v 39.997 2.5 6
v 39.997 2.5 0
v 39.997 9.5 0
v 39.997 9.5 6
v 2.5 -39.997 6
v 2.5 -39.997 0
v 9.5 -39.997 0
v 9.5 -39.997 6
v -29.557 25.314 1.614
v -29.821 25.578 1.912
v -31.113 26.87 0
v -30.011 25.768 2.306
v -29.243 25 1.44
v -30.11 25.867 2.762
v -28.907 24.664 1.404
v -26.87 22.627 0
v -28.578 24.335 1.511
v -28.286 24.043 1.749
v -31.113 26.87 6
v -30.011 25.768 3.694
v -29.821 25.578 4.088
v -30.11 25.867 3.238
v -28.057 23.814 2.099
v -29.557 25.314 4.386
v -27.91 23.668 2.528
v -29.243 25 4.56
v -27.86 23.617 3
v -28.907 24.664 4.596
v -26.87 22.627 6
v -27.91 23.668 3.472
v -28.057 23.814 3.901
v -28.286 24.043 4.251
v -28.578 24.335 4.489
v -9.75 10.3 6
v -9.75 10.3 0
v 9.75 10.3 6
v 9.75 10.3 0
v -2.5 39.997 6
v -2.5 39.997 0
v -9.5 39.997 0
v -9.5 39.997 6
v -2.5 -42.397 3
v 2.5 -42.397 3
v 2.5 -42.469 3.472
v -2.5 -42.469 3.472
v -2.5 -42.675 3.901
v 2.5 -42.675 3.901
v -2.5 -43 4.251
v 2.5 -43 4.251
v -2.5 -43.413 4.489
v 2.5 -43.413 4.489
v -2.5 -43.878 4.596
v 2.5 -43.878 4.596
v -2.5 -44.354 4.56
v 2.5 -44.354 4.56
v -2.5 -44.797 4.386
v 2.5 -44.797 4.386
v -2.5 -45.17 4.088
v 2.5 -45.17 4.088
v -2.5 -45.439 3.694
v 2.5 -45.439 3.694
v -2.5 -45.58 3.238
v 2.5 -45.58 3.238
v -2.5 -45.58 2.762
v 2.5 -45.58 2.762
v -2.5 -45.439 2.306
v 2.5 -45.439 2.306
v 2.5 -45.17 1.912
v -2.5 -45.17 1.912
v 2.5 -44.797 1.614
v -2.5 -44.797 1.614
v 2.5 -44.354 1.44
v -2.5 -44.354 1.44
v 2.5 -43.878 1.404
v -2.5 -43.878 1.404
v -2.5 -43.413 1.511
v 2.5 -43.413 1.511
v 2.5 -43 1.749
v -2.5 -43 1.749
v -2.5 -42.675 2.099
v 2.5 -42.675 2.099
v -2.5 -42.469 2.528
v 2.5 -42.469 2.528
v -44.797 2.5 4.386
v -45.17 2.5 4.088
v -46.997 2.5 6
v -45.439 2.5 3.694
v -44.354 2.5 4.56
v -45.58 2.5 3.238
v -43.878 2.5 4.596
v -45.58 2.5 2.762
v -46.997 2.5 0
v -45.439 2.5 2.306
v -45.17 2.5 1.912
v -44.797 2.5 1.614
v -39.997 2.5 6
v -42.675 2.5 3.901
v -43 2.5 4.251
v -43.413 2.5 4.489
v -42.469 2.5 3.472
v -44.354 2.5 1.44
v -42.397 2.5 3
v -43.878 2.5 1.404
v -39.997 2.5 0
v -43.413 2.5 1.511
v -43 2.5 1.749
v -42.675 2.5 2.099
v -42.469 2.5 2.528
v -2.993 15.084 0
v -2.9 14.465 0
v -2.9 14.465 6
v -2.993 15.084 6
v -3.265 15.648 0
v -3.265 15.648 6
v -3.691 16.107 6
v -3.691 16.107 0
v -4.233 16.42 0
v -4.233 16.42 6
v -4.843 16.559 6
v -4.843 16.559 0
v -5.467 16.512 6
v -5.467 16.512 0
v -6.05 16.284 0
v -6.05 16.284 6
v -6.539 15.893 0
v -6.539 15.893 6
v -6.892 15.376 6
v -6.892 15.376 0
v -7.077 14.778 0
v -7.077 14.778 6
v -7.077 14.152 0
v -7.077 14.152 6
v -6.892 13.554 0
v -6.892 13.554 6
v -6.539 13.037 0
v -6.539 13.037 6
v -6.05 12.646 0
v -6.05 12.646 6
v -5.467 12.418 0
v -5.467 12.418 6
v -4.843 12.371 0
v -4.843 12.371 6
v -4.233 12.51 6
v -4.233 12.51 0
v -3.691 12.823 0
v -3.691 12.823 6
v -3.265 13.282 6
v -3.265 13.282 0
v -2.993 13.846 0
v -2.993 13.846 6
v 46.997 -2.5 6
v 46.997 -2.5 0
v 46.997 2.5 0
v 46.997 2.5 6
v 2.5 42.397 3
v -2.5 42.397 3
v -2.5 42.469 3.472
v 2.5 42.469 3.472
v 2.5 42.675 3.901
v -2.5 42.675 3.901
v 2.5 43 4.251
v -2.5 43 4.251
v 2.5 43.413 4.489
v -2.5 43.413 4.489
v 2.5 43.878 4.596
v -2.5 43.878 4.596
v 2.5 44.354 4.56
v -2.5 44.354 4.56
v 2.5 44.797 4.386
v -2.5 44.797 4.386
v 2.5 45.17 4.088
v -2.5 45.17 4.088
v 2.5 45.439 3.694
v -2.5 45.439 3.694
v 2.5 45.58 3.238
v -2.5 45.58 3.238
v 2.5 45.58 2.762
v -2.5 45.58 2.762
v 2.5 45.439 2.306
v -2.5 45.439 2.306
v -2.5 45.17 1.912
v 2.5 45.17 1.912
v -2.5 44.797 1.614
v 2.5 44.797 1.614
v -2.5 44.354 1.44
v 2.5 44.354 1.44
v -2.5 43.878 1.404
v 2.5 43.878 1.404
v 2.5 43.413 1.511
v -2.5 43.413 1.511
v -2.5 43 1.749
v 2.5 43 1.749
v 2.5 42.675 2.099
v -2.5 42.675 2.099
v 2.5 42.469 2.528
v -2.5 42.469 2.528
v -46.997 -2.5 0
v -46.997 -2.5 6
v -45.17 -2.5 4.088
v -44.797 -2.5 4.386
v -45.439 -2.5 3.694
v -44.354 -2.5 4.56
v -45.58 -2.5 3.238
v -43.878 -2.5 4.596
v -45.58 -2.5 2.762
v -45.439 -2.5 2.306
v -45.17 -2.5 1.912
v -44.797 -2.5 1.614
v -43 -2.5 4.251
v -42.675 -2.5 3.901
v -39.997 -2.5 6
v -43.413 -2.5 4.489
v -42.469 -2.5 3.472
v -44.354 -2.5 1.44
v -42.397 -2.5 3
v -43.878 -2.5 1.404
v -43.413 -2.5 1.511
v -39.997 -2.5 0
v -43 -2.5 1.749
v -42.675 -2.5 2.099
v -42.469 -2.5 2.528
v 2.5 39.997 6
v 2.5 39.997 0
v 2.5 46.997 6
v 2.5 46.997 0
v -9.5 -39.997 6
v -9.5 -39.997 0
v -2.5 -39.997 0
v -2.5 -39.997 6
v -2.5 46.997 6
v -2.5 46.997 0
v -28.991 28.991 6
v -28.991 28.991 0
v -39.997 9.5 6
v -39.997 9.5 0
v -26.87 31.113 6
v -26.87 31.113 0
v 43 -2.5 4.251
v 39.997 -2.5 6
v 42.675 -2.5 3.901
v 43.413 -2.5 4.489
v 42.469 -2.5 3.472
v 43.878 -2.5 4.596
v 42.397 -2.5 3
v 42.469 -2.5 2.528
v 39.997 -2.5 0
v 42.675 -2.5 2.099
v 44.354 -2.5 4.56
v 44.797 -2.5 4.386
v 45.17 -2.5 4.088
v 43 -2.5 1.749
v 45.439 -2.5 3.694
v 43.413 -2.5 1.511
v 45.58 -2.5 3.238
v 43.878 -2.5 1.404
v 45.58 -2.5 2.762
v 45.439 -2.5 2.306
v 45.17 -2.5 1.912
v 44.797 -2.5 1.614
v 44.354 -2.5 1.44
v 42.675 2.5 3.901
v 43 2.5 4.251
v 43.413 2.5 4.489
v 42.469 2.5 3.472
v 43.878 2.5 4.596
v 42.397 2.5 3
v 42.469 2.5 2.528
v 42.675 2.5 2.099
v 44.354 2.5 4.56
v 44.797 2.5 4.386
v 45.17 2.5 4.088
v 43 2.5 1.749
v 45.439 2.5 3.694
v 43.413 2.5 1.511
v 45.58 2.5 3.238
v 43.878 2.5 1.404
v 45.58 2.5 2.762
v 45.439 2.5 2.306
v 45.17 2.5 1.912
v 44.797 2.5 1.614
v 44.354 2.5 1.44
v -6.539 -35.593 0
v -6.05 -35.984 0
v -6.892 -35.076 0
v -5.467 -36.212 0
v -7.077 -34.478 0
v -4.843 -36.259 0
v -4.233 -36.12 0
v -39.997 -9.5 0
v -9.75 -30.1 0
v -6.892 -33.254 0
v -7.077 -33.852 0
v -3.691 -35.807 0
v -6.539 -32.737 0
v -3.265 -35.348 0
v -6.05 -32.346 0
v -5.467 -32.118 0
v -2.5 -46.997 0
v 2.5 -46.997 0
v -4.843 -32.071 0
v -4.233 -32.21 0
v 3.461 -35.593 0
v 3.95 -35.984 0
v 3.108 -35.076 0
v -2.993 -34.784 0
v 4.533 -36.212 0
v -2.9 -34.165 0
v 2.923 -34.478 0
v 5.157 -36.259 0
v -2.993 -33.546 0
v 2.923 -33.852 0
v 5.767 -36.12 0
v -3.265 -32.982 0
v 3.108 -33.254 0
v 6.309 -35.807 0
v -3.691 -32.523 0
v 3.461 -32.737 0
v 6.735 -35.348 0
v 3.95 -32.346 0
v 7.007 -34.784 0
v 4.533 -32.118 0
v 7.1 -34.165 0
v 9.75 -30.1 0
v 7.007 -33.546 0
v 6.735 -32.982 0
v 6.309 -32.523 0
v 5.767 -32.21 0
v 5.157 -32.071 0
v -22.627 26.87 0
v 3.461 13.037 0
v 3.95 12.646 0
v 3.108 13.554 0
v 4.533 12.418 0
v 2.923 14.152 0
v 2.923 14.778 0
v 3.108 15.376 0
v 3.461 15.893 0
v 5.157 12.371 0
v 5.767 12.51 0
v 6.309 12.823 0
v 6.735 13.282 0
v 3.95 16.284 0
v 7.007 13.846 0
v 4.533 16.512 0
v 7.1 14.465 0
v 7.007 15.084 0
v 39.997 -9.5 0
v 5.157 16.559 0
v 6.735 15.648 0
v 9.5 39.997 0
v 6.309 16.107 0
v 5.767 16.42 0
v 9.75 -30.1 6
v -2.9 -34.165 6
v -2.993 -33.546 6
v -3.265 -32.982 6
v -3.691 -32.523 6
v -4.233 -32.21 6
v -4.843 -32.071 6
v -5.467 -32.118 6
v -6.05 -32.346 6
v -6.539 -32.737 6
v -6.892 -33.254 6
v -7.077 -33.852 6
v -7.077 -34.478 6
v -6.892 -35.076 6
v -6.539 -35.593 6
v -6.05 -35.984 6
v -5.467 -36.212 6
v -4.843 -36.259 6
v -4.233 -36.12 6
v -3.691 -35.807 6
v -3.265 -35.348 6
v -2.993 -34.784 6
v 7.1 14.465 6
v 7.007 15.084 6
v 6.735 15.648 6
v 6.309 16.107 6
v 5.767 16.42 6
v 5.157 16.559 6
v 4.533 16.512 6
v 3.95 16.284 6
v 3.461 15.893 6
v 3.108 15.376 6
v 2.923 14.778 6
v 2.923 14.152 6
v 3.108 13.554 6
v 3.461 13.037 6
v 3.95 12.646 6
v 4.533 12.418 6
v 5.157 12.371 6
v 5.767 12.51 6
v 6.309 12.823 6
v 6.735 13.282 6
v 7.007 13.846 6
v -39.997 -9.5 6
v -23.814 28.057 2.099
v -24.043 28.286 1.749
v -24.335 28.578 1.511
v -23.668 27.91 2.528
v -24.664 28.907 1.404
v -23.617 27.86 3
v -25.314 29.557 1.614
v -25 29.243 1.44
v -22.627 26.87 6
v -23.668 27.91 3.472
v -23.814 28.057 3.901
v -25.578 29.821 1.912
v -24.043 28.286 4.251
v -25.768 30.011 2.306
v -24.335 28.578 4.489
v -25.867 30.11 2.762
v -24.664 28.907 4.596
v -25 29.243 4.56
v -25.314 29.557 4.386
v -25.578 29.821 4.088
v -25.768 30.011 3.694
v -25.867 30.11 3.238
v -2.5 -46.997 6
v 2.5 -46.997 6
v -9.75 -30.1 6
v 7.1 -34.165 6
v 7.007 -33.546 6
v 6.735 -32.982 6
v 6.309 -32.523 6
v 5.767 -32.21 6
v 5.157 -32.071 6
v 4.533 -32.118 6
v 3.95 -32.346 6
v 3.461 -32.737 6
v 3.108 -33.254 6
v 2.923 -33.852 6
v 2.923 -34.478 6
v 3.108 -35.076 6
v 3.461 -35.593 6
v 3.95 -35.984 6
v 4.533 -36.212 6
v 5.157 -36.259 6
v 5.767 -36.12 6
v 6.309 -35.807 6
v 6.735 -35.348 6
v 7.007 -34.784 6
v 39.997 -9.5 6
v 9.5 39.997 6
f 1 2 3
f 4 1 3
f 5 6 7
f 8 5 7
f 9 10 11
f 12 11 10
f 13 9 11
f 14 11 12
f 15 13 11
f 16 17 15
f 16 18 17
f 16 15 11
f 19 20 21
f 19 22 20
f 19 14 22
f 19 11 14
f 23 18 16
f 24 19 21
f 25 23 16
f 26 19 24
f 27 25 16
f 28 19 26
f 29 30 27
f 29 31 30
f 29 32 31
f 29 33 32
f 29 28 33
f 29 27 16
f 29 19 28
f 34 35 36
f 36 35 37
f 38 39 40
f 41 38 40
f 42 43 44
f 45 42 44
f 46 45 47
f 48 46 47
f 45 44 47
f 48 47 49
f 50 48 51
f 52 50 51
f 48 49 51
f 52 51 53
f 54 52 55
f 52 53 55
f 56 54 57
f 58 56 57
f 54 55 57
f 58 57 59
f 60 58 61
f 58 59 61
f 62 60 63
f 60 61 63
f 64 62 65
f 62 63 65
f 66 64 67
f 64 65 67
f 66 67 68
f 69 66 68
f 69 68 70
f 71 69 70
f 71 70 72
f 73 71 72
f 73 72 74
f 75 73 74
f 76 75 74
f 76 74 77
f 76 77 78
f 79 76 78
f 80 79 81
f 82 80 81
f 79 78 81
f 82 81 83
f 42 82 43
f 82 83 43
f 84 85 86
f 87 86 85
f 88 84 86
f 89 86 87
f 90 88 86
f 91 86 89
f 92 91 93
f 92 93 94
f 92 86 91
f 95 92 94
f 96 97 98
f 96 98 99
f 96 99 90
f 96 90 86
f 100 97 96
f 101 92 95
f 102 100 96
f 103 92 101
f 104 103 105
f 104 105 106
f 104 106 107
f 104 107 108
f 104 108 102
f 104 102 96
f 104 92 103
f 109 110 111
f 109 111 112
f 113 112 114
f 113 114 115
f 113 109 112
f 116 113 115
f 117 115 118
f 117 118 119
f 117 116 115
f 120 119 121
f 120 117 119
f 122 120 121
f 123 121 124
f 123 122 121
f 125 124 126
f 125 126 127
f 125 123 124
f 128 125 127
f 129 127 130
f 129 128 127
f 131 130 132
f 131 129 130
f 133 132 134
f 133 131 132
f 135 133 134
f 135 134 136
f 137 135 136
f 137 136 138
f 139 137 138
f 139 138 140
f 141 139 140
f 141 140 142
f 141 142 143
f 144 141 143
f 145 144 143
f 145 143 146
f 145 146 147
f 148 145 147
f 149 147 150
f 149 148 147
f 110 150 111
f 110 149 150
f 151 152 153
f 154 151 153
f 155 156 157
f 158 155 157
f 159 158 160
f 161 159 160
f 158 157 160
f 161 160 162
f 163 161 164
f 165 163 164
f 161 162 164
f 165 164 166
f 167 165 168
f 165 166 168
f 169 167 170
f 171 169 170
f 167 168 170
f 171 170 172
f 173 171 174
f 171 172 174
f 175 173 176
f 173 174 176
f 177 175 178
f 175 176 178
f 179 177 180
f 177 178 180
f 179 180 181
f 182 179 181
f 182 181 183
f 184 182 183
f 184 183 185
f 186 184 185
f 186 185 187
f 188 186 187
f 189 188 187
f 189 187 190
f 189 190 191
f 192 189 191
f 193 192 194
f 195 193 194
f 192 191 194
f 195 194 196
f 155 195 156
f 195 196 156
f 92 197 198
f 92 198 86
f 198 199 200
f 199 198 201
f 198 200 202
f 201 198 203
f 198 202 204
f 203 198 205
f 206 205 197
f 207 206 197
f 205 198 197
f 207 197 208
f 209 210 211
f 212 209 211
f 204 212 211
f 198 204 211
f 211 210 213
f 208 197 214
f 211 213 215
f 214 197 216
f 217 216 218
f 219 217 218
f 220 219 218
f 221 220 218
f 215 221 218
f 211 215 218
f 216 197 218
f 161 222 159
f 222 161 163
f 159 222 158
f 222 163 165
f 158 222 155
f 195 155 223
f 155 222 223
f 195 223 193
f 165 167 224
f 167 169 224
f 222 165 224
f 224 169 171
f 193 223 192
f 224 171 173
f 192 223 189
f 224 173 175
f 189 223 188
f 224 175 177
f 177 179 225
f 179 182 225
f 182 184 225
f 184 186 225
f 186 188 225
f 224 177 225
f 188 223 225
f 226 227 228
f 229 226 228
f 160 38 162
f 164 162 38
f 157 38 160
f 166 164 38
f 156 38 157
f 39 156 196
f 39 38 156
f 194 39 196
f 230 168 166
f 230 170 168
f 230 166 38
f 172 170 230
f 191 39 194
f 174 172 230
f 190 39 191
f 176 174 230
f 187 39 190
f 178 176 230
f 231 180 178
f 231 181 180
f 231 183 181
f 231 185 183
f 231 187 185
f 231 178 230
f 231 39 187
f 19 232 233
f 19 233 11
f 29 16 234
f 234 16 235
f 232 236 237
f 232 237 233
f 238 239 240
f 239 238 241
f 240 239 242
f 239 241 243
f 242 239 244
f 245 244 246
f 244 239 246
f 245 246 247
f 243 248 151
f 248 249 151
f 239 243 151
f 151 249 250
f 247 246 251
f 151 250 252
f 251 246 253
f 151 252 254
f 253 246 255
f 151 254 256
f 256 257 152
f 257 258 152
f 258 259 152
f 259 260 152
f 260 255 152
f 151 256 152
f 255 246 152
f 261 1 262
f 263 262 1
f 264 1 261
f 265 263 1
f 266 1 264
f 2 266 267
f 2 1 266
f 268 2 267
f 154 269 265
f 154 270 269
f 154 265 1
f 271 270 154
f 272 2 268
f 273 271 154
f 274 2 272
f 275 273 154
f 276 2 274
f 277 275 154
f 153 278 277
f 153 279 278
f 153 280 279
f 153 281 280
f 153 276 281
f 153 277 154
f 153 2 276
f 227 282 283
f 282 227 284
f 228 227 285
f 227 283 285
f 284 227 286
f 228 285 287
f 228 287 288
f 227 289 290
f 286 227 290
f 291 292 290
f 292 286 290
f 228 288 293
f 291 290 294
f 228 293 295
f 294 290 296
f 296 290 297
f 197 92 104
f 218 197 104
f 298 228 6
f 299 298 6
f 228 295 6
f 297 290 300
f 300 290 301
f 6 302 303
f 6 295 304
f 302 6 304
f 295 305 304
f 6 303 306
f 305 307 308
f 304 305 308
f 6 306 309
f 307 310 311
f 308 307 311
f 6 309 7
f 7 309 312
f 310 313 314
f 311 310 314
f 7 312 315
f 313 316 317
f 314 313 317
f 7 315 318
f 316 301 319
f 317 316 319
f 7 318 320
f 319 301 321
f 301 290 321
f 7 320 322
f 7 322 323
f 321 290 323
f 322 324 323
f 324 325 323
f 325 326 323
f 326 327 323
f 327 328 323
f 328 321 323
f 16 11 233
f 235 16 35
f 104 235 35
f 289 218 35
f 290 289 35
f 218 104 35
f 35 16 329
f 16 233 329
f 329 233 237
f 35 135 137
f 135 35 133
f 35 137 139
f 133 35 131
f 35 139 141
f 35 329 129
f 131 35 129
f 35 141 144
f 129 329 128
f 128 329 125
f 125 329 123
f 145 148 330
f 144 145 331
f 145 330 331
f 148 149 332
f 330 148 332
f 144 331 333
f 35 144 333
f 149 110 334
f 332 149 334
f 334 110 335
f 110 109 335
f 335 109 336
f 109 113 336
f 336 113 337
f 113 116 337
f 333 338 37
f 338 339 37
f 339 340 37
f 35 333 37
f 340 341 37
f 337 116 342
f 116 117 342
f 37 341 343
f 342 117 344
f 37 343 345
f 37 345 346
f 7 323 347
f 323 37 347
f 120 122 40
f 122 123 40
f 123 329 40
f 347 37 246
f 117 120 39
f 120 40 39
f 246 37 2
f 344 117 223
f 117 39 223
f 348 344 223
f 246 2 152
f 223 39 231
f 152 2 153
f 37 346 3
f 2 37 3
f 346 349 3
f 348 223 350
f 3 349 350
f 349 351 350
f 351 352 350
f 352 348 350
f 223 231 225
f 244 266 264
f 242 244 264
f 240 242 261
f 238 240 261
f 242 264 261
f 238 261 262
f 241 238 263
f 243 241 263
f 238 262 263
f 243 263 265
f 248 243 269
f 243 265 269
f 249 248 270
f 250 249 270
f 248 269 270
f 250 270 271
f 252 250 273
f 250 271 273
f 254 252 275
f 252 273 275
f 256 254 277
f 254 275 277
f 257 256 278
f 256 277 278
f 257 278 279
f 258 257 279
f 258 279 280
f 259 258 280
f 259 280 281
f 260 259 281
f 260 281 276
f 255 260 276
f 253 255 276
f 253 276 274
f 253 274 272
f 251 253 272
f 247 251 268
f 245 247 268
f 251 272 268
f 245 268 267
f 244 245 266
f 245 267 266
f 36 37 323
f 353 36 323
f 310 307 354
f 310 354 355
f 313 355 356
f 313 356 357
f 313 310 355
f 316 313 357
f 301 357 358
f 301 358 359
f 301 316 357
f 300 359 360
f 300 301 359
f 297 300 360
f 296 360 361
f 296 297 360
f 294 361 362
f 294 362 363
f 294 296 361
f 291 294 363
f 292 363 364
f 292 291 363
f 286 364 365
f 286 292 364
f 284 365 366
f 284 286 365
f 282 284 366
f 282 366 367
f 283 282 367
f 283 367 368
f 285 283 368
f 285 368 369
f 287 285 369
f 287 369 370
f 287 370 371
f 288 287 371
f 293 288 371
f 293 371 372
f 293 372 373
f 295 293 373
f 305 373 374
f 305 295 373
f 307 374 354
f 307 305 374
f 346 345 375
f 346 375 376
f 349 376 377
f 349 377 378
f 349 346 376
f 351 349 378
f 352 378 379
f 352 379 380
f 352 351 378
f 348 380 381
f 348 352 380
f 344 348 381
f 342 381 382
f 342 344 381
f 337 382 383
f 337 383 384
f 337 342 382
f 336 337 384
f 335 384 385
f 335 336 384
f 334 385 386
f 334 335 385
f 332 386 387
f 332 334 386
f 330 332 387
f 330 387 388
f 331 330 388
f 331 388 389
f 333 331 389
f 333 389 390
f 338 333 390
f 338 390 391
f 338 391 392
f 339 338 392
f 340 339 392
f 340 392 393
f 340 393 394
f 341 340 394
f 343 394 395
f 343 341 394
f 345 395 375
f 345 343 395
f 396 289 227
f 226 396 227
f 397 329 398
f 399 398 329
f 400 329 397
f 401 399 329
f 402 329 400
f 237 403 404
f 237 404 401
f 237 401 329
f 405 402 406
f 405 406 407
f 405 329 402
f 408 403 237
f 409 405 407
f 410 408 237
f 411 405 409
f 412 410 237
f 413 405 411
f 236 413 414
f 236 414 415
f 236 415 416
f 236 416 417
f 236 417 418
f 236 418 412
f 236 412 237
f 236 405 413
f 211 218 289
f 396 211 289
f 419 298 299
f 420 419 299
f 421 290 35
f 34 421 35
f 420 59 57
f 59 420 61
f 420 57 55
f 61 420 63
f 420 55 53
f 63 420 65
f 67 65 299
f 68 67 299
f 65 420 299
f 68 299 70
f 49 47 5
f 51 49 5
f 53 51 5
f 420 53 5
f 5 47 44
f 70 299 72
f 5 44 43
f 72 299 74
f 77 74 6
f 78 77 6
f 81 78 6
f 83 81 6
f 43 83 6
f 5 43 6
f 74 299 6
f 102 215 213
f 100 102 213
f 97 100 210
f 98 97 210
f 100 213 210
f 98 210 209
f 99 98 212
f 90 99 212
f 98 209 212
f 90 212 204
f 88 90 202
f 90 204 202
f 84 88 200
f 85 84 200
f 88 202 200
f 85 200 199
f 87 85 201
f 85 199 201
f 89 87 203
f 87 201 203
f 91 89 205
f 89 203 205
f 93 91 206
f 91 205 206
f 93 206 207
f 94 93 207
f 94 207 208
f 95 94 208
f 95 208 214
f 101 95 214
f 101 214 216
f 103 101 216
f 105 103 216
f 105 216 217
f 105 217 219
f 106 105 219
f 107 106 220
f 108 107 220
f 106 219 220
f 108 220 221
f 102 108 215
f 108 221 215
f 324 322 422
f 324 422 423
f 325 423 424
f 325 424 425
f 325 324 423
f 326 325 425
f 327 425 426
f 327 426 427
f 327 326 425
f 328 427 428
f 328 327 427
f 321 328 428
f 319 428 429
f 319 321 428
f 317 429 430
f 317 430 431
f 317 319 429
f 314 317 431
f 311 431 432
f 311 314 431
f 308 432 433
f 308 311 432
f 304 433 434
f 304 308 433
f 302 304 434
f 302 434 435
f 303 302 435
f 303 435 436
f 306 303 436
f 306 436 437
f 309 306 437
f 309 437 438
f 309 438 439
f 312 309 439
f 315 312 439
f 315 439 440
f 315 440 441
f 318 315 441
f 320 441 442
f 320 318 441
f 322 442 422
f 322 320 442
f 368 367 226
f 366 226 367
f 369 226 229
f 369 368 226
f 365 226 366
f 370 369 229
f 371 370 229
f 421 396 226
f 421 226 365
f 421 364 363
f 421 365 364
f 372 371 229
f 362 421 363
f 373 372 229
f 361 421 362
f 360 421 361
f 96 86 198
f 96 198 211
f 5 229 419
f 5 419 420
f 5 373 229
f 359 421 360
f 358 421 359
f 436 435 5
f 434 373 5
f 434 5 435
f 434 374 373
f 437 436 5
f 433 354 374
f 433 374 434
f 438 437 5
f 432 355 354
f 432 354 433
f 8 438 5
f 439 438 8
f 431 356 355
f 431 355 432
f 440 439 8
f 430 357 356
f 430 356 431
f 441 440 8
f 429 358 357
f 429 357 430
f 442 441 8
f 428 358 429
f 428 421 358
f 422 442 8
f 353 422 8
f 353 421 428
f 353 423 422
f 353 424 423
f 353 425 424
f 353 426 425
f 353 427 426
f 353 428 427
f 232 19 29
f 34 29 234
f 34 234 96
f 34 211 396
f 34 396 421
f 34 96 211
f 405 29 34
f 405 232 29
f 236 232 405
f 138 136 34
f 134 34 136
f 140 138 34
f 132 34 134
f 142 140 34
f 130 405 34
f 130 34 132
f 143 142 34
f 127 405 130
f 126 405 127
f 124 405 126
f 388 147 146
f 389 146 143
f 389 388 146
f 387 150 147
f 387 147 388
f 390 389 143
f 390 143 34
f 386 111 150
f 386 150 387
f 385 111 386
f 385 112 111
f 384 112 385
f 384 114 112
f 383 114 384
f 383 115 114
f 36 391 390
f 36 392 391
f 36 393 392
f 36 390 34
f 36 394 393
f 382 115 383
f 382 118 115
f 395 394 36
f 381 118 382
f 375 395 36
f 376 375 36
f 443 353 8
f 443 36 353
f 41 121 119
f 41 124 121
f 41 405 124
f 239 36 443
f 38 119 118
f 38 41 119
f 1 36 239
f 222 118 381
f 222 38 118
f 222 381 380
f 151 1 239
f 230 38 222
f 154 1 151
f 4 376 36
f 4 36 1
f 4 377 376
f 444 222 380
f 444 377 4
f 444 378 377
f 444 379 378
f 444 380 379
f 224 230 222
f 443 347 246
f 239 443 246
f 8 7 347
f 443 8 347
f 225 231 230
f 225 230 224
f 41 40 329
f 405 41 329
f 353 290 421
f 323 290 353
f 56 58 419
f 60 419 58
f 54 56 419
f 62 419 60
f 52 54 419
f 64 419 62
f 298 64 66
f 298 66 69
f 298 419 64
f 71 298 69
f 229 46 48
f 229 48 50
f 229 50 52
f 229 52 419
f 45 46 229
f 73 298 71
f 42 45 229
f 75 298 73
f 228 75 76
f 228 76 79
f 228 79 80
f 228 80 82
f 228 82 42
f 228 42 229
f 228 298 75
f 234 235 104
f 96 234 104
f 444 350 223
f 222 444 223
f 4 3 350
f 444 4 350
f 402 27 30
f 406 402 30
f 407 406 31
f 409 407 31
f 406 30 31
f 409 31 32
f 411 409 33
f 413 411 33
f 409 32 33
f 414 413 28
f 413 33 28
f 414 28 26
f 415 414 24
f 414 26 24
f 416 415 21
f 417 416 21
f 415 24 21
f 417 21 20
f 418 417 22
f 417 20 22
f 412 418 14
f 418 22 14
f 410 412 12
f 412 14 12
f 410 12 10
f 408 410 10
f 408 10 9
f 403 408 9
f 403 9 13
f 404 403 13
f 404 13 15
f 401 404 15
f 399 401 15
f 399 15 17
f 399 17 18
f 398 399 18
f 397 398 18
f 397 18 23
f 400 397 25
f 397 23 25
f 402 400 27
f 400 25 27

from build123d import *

# Parameters (mm, degrees)
SKETCH_1_R          = 2.1
SKETCH_1_W          = 5
SKETCH_1_H          = 7
SKETCH_1_W_2        = 7
SKETCH_1_H_2        = 5
SKETCH_1_W_3        = 19.5
SKETCH_1_H_3        = 6.75
EXTRUDE_2_DEPTH     = 6
SKETCH_2_R          = 1.6
CUT_EXTRUDE_1_DEPTH = 5
SKETCH_3_R          = 1.6
CUT_EXTRUDE_2_DEPTH = 5
SKETCH_4_R          = 1.6
CUT_EXTRUDE_3_DEPTH = 5
SKETCH_5_R          = 1.6
CUT_EXTRUDE_4_DEPTH = 5
EXTRUDE_3_DEPTH     = 6
SKETCH_7_R          = 1.6
CUT_EXTRUDE_5_DEPTH = 6


with BuildPart() as part:
    # 草图1 → 凸台-拉伸2 (new body)
    # profile 1 of 6: a face of its own
    with BuildSketch(Plane.XY):
        Polygon((-9.5, 39.997474683), (-39.997474683, 9.5), (-39.997474683, 2.5), (-39.997474683, -2.5), (-39.997474683, -9.5), (-9.5, -39.997474683), (-2.5, -39.997474683), (2.5, -39.997474683), (9.5, -39.997474683), (39.997474683, -9.5), (39.997474683, -2.5), (39.997474683, 2.5), (39.997474683, 9.5), (9.5, 39.997474683), (2.5, 39.997474683), (-2.5, 39.997474683), align=None)
        Polygon((-9.75, -30.1), (-9.75, 10.3), (9.75, 10.3), (9.75, -30.1), (9.75, -36.85), (-9.75, -36.85), align=None, mode=Mode.SUBTRACT)
        with Locations((-5, 14.465)):
            Circle(SKETCH_1_R, mode=Mode.SUBTRACT)
        with Locations((5, 14.465)):
            Circle(SKETCH_1_R, mode=Mode.SUBTRACT)
    # profile 2 of 6: a face of its own
    with BuildSketch(Plane.XY):
        with Locations((0, 43.497474683)):
            Rectangle(SKETCH_1_W, SKETCH_1_H)
    # profile 3 of 6: a face of its own
    with BuildSketch(Plane.XY):
        with Locations((-43.497474683, 0)):
            Rectangle(SKETCH_1_W_2, SKETCH_1_H_2)
    # profile 4 of 6: a face of its own
    with BuildSketch(Plane.XY):
        with Locations((0, -43.497474683)):
            Rectangle(SKETCH_1_W, SKETCH_1_H)
    # profile 5 of 6: a face of its own
    with BuildSketch(Plane.XY):
        with Locations((43.497474683, 0)):
            Rectangle(SKETCH_1_W_2, SKETCH_1_H_2)
    # profile 6 of 6: a face of its own
    with BuildSketch(Plane.XY):
        with Locations((0, -33.475)):
            Rectangle(SKETCH_1_W_3, SKETCH_1_H_3)
        with Locations((5, -34.165)):
            Circle(SKETCH_1_R, mode=Mode.SUBTRACT)
        with Locations((-5, -34.165)):
            Circle(SKETCH_1_R, mode=Mode.SUBTRACT)
    extrude(amount=EXTRUDE_2_DEPTH)

    # 草图2 → 切除-拉伸1 (cut)
    with BuildSketch(Plane.XZ.offset(2.5)):
        with Locations((-43.997474683, 3)):
            Circle(SKETCH_2_R)
    extrude(amount=-CUT_EXTRUDE_1_DEPTH, mode=Mode.SUBTRACT)

    # 草图3 → 切除-拉伸2 (cut)
    with BuildSketch(Plane(origin=(2.5, 0, 0), x_dir=(0, 0, -1), z_dir=(1, 0, 0))):
        with Locations(Location((-3, -43.997474683, 0), (0, 0, 90))):
            Circle(SKETCH_3_R)
    extrude(amount=-CUT_EXTRUDE_2_DEPTH, mode=Mode.SUBTRACT)

    # 草图4 → 切除-拉伸3 (cut)
    with BuildSketch(Plane(origin=(0, 2.5, 0), x_dir=(1, 0, 0), z_dir=(0, 1, 0))):
        with Locations(Location((43.997474683, -3, 0), (0, 0, 180))):
            Circle(SKETCH_4_R)
    extrude(amount=-CUT_EXTRUDE_3_DEPTH, mode=Mode.SUBTRACT)

    # 草图5 → 切除-拉伸4 (cut)
    with BuildSketch(Plane.ZY.offset(2.5)):
        with Locations(Location((3, 43.997474683, 0), (0, 0, 270))):
            Circle(SKETCH_5_R)
    extrude(amount=-CUT_EXTRUDE_4_DEPTH, mode=Mode.SUBTRACT)

    # 草图6 → 凸台-拉伸3 (add)
    with BuildSketch(Plane.XY.offset(6)):
        Polygon((-26.870057685, 22.627416998), (-24.748737342, 24.748737342), (-28.991378029, 28.991378029), (-31.112698372, 26.870057685), align=None)
        Polygon((-24.748737342, 24.748737342), (-22.627416998, 26.870057685), (-26.870057685, 31.112698372), (-28.991378029, 28.991378029), align=None)
    extrude(amount=-EXTRUDE_3_DEPTH)

    # 草图7 → 切除-拉伸5 (cut)
    with BuildSketch(Plane(origin=(-2.121320344, -2.121320344, 0), x_dir=(0, 0, 1), z_dir=(-0.7071067811865471, -0.7071067811865479, 0))):
        with Locations(Location((3, 38, 0), (0, 0, 270))):
            Circle(SKETCH_7_R)
    extrude(amount=-CUT_EXTRUDE_5_DEPTH, mode=Mode.SUBTRACT)


solid = part.part
